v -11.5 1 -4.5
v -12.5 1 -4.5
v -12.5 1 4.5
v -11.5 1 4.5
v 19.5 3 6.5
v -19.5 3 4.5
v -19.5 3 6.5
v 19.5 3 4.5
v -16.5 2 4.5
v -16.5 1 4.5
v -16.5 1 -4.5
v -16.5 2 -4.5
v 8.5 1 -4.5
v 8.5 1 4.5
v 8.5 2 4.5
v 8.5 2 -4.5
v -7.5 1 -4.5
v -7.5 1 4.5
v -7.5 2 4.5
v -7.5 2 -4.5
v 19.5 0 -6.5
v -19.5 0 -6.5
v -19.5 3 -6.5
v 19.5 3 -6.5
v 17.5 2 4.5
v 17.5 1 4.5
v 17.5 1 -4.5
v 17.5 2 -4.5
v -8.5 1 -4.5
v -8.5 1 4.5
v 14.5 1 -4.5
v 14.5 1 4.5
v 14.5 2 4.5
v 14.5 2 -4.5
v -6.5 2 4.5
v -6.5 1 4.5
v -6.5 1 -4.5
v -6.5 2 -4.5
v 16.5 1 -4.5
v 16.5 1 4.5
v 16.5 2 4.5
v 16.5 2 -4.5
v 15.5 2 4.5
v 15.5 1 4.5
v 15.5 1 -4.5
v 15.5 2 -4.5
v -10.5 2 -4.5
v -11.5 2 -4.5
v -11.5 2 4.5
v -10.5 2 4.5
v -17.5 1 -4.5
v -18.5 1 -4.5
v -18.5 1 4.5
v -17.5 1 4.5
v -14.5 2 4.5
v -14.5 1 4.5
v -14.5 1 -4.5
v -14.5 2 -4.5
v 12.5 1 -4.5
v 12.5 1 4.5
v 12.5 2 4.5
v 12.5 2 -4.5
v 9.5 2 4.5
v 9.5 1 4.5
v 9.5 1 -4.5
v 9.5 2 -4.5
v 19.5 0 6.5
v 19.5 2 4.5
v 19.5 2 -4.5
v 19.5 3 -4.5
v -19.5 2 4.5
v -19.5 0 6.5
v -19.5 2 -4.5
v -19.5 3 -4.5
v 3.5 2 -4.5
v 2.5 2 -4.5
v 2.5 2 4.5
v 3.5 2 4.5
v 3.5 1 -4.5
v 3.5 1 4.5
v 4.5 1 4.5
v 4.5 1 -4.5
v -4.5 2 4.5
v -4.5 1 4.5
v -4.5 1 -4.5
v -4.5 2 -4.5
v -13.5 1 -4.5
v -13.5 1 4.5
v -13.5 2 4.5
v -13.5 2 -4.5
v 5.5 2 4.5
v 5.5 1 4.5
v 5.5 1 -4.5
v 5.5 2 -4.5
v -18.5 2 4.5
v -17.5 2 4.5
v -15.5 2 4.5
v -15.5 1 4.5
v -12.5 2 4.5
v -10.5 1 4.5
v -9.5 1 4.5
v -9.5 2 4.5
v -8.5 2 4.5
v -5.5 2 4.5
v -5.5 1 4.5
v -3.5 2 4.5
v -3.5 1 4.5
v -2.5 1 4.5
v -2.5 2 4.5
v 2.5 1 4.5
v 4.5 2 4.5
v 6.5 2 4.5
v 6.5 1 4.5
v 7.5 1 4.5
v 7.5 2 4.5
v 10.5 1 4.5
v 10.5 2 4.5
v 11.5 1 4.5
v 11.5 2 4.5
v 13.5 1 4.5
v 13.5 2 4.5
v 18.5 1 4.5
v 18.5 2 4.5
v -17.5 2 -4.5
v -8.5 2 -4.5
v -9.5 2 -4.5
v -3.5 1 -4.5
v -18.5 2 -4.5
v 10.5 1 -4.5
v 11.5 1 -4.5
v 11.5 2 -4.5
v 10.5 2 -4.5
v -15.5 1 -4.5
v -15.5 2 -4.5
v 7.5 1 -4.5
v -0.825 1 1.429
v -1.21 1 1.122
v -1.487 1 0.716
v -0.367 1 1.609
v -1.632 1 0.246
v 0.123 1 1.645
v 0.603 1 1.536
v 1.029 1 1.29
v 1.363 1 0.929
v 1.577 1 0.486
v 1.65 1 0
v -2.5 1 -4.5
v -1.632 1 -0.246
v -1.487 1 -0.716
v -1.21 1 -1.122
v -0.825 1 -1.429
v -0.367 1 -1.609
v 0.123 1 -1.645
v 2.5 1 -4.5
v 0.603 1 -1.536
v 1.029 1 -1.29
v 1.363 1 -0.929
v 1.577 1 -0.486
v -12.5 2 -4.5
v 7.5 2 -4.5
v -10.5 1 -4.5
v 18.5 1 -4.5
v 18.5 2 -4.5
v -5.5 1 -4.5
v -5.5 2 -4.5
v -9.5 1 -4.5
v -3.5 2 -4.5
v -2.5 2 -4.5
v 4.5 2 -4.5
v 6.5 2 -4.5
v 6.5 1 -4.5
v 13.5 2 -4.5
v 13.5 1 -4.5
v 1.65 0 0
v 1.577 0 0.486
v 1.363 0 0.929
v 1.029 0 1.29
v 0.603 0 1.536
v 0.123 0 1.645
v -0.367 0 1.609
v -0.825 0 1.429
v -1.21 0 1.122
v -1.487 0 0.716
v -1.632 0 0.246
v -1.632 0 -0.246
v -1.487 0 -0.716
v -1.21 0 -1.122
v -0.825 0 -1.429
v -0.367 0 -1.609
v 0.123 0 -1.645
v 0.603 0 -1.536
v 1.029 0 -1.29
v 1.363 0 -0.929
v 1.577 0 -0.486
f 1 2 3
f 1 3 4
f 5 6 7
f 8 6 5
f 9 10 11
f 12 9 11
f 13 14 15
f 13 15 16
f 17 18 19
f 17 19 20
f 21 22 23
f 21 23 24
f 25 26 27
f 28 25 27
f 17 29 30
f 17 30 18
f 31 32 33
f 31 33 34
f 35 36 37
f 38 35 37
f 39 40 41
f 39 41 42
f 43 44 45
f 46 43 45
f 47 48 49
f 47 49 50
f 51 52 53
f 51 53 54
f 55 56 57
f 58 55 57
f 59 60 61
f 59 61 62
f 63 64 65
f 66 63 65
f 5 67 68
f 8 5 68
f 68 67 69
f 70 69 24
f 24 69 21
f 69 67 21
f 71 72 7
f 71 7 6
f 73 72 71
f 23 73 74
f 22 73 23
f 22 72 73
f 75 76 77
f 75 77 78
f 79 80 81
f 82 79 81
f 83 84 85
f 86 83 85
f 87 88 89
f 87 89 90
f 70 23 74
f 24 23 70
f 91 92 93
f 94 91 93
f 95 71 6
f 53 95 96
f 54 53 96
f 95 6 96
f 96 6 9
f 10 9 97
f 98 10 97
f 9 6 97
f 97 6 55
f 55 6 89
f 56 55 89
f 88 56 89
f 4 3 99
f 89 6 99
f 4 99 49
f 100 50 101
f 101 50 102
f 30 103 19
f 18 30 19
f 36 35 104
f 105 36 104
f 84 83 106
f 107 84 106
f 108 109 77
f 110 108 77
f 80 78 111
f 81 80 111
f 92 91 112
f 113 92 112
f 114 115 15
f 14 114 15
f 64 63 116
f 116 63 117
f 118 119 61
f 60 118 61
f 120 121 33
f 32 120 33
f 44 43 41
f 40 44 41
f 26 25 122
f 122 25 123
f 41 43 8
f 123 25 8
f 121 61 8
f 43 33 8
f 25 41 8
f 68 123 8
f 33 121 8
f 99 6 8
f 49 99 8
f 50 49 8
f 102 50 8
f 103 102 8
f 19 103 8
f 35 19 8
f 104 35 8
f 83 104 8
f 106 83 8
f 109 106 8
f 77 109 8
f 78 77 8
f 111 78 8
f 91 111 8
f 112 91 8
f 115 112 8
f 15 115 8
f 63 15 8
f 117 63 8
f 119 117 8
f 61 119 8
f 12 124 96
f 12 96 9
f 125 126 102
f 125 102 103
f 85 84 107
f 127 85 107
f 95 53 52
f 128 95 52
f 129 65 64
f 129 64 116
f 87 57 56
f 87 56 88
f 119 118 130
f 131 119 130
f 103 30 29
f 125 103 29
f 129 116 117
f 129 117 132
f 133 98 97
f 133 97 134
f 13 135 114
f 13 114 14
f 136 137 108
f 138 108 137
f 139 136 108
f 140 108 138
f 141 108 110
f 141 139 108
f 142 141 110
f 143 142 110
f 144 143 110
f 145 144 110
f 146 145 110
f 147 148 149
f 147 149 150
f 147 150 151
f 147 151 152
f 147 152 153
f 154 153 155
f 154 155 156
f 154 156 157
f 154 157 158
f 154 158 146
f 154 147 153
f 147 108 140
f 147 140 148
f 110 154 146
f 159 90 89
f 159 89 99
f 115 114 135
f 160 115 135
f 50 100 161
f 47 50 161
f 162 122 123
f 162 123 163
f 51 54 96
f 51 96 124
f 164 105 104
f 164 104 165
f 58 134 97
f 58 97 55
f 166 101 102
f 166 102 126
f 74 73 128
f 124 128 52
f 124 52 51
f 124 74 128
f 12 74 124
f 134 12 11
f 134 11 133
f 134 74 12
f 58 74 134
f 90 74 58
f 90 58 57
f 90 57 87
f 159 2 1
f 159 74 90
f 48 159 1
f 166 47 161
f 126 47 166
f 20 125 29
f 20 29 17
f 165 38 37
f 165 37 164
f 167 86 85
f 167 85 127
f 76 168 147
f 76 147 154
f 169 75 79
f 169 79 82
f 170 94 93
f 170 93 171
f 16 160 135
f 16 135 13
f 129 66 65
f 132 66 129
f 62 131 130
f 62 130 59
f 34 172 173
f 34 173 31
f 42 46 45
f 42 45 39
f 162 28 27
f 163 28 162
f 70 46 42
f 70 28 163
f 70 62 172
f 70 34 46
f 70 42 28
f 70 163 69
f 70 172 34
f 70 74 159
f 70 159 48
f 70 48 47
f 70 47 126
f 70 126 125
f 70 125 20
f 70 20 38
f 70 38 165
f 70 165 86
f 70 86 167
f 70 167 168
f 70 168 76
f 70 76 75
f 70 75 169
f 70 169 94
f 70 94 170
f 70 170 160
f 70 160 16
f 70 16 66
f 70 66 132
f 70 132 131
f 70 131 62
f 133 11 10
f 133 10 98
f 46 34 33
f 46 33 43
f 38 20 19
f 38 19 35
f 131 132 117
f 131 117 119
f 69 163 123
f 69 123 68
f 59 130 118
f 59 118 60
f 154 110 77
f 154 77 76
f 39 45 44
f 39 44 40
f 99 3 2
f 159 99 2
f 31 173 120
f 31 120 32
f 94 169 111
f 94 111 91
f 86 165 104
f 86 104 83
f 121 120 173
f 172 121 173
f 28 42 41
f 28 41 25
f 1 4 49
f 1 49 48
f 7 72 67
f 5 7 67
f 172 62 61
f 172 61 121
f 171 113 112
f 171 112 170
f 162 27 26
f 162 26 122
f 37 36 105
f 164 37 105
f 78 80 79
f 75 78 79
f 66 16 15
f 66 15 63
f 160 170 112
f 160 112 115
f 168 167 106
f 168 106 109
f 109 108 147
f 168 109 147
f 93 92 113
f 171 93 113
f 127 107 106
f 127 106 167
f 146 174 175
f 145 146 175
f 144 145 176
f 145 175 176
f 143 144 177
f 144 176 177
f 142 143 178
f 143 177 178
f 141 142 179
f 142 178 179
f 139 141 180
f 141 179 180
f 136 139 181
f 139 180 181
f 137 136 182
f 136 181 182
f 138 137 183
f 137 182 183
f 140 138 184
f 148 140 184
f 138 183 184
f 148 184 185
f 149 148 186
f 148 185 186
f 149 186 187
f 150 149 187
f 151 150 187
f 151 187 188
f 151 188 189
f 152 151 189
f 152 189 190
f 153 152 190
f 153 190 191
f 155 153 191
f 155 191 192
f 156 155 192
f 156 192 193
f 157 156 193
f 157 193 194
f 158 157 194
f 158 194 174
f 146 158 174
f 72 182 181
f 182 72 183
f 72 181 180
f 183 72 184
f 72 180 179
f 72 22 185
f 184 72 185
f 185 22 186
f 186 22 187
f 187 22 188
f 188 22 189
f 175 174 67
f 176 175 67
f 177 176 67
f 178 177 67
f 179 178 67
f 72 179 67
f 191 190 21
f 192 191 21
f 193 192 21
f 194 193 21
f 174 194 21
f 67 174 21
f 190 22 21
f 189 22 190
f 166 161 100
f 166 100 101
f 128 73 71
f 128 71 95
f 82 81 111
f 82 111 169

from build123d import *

# Parameters (mm, degrees)
SKETCH1_W           = 39
SKETCH1_H           = 13
BOSS_EXTRUDE1_DEPTH = 3
SKETCH5_W           = 39
SKETCH5_H           = 9
CUT_EXTRUDE1_DEPTH  = 2
SKETCH2_W           = 1
SKETCH2_H           = 9
BOSS_EXTRUDE2_DEPTH = 1
SKETCH6_R           = 1.65
CUT_EXTRUDE2_DEPTH  = 4


with BuildPart() as part:
    # Sketch1 → Boss-Extrude1 (new body)
    with BuildSketch(Plane(origin=(0, 0, 0), x_dir=(1, 0, 0), z_dir=(0, 1, 0))):
        Rectangle(SKETCH1_W, SKETCH1_H)
    extrude(amount=BOSS_EXTRUDE1_DEPTH)

    # Sketch5 → Cut-Extrude1 (cut)
    with BuildSketch(Plane(origin=(0, 3, 0), x_dir=(1, 0, 0), z_dir=(0, 1, 0))):
        Rectangle(SKETCH5_W, SKETCH5_H)
    extrude(amount=-CUT_EXTRUDE1_DEPTH, mode=Mode.SUBTRACT)

    # Sketch2 → Boss-Extrude2 (add)
    with BuildSketch(Plane(origin=(0, 1, 0), x_dir=(1, 0, 0), z_dir=(0, 1, 0))):
        with Locations((7, 0)):
            Rectangle(SKETCH2_W, SKETCH2_H)
        with Locations((5, 0)):
            Rectangle(SKETCH2_W, SKETCH2_H)
        with Locations((9, 0)):
            Rectangle(SKETCH2_W, SKETCH2_H)
        with Locations((3, 0)):
            Rectangle(SKETCH2_W, SKETCH2_H)
        with Locations((11, 0)):
            Rectangle(SKETCH2_W, SKETCH2_H)
        with Locations((13, 0)):
            Rectangle(SKETCH2_W, SKETCH2_H)
        with Locations((15, 0)):
            Rectangle(SKETCH2_W, SKETCH2_H)
        with Locations((-3, 0)):
            Rectangle(SKETCH2_W, SKETCH2_H)
        with Locations((17, 0)):
            Rectangle(SKETCH2_W, SKETCH2_H)
        with Locations((-5, 0)):
            Rectangle(SKETCH2_W, SKETCH2_H)
        with Locations((19, 0)):
            Rectangle(SKETCH2_W, SKETCH2_H)
        with Locations((-7, 0)):
            Rectangle(SKETCH2_W, SKETCH2_H)
        with Locations((-9, 0)):
            Rectangle(SKETCH2_W, SKETCH2_H)
        with Locations((-11, 0)):
            Rectangle(SKETCH2_W, SKETCH2_H)
        with Locations((-13, 0)):
            Rectangle(SKETCH2_W, SKETCH2_H)
        with Locations((-15, 0)):
            Rectangle(SKETCH2_W, SKETCH2_H)
        with Locations((-17, 0)):
            Rectangle(SKETCH2_W, SKETCH2_H)
        with Locations((-19, 0)):
            Rectangle(SKETCH2_W, SKETCH2_H)
    extrude(amount=BOSS_EXTRUDE2_DEPTH)

    # Sketch6 → Cut-Extrude2 (cut, through all)
    with BuildSketch(Plane.XZ):
        Circle(SKETCH6_R)
    extrude(amount=-CUT_EXTRUDE2_DEPTH, mode=Mode.SUBTRACT)


solid = part.part
